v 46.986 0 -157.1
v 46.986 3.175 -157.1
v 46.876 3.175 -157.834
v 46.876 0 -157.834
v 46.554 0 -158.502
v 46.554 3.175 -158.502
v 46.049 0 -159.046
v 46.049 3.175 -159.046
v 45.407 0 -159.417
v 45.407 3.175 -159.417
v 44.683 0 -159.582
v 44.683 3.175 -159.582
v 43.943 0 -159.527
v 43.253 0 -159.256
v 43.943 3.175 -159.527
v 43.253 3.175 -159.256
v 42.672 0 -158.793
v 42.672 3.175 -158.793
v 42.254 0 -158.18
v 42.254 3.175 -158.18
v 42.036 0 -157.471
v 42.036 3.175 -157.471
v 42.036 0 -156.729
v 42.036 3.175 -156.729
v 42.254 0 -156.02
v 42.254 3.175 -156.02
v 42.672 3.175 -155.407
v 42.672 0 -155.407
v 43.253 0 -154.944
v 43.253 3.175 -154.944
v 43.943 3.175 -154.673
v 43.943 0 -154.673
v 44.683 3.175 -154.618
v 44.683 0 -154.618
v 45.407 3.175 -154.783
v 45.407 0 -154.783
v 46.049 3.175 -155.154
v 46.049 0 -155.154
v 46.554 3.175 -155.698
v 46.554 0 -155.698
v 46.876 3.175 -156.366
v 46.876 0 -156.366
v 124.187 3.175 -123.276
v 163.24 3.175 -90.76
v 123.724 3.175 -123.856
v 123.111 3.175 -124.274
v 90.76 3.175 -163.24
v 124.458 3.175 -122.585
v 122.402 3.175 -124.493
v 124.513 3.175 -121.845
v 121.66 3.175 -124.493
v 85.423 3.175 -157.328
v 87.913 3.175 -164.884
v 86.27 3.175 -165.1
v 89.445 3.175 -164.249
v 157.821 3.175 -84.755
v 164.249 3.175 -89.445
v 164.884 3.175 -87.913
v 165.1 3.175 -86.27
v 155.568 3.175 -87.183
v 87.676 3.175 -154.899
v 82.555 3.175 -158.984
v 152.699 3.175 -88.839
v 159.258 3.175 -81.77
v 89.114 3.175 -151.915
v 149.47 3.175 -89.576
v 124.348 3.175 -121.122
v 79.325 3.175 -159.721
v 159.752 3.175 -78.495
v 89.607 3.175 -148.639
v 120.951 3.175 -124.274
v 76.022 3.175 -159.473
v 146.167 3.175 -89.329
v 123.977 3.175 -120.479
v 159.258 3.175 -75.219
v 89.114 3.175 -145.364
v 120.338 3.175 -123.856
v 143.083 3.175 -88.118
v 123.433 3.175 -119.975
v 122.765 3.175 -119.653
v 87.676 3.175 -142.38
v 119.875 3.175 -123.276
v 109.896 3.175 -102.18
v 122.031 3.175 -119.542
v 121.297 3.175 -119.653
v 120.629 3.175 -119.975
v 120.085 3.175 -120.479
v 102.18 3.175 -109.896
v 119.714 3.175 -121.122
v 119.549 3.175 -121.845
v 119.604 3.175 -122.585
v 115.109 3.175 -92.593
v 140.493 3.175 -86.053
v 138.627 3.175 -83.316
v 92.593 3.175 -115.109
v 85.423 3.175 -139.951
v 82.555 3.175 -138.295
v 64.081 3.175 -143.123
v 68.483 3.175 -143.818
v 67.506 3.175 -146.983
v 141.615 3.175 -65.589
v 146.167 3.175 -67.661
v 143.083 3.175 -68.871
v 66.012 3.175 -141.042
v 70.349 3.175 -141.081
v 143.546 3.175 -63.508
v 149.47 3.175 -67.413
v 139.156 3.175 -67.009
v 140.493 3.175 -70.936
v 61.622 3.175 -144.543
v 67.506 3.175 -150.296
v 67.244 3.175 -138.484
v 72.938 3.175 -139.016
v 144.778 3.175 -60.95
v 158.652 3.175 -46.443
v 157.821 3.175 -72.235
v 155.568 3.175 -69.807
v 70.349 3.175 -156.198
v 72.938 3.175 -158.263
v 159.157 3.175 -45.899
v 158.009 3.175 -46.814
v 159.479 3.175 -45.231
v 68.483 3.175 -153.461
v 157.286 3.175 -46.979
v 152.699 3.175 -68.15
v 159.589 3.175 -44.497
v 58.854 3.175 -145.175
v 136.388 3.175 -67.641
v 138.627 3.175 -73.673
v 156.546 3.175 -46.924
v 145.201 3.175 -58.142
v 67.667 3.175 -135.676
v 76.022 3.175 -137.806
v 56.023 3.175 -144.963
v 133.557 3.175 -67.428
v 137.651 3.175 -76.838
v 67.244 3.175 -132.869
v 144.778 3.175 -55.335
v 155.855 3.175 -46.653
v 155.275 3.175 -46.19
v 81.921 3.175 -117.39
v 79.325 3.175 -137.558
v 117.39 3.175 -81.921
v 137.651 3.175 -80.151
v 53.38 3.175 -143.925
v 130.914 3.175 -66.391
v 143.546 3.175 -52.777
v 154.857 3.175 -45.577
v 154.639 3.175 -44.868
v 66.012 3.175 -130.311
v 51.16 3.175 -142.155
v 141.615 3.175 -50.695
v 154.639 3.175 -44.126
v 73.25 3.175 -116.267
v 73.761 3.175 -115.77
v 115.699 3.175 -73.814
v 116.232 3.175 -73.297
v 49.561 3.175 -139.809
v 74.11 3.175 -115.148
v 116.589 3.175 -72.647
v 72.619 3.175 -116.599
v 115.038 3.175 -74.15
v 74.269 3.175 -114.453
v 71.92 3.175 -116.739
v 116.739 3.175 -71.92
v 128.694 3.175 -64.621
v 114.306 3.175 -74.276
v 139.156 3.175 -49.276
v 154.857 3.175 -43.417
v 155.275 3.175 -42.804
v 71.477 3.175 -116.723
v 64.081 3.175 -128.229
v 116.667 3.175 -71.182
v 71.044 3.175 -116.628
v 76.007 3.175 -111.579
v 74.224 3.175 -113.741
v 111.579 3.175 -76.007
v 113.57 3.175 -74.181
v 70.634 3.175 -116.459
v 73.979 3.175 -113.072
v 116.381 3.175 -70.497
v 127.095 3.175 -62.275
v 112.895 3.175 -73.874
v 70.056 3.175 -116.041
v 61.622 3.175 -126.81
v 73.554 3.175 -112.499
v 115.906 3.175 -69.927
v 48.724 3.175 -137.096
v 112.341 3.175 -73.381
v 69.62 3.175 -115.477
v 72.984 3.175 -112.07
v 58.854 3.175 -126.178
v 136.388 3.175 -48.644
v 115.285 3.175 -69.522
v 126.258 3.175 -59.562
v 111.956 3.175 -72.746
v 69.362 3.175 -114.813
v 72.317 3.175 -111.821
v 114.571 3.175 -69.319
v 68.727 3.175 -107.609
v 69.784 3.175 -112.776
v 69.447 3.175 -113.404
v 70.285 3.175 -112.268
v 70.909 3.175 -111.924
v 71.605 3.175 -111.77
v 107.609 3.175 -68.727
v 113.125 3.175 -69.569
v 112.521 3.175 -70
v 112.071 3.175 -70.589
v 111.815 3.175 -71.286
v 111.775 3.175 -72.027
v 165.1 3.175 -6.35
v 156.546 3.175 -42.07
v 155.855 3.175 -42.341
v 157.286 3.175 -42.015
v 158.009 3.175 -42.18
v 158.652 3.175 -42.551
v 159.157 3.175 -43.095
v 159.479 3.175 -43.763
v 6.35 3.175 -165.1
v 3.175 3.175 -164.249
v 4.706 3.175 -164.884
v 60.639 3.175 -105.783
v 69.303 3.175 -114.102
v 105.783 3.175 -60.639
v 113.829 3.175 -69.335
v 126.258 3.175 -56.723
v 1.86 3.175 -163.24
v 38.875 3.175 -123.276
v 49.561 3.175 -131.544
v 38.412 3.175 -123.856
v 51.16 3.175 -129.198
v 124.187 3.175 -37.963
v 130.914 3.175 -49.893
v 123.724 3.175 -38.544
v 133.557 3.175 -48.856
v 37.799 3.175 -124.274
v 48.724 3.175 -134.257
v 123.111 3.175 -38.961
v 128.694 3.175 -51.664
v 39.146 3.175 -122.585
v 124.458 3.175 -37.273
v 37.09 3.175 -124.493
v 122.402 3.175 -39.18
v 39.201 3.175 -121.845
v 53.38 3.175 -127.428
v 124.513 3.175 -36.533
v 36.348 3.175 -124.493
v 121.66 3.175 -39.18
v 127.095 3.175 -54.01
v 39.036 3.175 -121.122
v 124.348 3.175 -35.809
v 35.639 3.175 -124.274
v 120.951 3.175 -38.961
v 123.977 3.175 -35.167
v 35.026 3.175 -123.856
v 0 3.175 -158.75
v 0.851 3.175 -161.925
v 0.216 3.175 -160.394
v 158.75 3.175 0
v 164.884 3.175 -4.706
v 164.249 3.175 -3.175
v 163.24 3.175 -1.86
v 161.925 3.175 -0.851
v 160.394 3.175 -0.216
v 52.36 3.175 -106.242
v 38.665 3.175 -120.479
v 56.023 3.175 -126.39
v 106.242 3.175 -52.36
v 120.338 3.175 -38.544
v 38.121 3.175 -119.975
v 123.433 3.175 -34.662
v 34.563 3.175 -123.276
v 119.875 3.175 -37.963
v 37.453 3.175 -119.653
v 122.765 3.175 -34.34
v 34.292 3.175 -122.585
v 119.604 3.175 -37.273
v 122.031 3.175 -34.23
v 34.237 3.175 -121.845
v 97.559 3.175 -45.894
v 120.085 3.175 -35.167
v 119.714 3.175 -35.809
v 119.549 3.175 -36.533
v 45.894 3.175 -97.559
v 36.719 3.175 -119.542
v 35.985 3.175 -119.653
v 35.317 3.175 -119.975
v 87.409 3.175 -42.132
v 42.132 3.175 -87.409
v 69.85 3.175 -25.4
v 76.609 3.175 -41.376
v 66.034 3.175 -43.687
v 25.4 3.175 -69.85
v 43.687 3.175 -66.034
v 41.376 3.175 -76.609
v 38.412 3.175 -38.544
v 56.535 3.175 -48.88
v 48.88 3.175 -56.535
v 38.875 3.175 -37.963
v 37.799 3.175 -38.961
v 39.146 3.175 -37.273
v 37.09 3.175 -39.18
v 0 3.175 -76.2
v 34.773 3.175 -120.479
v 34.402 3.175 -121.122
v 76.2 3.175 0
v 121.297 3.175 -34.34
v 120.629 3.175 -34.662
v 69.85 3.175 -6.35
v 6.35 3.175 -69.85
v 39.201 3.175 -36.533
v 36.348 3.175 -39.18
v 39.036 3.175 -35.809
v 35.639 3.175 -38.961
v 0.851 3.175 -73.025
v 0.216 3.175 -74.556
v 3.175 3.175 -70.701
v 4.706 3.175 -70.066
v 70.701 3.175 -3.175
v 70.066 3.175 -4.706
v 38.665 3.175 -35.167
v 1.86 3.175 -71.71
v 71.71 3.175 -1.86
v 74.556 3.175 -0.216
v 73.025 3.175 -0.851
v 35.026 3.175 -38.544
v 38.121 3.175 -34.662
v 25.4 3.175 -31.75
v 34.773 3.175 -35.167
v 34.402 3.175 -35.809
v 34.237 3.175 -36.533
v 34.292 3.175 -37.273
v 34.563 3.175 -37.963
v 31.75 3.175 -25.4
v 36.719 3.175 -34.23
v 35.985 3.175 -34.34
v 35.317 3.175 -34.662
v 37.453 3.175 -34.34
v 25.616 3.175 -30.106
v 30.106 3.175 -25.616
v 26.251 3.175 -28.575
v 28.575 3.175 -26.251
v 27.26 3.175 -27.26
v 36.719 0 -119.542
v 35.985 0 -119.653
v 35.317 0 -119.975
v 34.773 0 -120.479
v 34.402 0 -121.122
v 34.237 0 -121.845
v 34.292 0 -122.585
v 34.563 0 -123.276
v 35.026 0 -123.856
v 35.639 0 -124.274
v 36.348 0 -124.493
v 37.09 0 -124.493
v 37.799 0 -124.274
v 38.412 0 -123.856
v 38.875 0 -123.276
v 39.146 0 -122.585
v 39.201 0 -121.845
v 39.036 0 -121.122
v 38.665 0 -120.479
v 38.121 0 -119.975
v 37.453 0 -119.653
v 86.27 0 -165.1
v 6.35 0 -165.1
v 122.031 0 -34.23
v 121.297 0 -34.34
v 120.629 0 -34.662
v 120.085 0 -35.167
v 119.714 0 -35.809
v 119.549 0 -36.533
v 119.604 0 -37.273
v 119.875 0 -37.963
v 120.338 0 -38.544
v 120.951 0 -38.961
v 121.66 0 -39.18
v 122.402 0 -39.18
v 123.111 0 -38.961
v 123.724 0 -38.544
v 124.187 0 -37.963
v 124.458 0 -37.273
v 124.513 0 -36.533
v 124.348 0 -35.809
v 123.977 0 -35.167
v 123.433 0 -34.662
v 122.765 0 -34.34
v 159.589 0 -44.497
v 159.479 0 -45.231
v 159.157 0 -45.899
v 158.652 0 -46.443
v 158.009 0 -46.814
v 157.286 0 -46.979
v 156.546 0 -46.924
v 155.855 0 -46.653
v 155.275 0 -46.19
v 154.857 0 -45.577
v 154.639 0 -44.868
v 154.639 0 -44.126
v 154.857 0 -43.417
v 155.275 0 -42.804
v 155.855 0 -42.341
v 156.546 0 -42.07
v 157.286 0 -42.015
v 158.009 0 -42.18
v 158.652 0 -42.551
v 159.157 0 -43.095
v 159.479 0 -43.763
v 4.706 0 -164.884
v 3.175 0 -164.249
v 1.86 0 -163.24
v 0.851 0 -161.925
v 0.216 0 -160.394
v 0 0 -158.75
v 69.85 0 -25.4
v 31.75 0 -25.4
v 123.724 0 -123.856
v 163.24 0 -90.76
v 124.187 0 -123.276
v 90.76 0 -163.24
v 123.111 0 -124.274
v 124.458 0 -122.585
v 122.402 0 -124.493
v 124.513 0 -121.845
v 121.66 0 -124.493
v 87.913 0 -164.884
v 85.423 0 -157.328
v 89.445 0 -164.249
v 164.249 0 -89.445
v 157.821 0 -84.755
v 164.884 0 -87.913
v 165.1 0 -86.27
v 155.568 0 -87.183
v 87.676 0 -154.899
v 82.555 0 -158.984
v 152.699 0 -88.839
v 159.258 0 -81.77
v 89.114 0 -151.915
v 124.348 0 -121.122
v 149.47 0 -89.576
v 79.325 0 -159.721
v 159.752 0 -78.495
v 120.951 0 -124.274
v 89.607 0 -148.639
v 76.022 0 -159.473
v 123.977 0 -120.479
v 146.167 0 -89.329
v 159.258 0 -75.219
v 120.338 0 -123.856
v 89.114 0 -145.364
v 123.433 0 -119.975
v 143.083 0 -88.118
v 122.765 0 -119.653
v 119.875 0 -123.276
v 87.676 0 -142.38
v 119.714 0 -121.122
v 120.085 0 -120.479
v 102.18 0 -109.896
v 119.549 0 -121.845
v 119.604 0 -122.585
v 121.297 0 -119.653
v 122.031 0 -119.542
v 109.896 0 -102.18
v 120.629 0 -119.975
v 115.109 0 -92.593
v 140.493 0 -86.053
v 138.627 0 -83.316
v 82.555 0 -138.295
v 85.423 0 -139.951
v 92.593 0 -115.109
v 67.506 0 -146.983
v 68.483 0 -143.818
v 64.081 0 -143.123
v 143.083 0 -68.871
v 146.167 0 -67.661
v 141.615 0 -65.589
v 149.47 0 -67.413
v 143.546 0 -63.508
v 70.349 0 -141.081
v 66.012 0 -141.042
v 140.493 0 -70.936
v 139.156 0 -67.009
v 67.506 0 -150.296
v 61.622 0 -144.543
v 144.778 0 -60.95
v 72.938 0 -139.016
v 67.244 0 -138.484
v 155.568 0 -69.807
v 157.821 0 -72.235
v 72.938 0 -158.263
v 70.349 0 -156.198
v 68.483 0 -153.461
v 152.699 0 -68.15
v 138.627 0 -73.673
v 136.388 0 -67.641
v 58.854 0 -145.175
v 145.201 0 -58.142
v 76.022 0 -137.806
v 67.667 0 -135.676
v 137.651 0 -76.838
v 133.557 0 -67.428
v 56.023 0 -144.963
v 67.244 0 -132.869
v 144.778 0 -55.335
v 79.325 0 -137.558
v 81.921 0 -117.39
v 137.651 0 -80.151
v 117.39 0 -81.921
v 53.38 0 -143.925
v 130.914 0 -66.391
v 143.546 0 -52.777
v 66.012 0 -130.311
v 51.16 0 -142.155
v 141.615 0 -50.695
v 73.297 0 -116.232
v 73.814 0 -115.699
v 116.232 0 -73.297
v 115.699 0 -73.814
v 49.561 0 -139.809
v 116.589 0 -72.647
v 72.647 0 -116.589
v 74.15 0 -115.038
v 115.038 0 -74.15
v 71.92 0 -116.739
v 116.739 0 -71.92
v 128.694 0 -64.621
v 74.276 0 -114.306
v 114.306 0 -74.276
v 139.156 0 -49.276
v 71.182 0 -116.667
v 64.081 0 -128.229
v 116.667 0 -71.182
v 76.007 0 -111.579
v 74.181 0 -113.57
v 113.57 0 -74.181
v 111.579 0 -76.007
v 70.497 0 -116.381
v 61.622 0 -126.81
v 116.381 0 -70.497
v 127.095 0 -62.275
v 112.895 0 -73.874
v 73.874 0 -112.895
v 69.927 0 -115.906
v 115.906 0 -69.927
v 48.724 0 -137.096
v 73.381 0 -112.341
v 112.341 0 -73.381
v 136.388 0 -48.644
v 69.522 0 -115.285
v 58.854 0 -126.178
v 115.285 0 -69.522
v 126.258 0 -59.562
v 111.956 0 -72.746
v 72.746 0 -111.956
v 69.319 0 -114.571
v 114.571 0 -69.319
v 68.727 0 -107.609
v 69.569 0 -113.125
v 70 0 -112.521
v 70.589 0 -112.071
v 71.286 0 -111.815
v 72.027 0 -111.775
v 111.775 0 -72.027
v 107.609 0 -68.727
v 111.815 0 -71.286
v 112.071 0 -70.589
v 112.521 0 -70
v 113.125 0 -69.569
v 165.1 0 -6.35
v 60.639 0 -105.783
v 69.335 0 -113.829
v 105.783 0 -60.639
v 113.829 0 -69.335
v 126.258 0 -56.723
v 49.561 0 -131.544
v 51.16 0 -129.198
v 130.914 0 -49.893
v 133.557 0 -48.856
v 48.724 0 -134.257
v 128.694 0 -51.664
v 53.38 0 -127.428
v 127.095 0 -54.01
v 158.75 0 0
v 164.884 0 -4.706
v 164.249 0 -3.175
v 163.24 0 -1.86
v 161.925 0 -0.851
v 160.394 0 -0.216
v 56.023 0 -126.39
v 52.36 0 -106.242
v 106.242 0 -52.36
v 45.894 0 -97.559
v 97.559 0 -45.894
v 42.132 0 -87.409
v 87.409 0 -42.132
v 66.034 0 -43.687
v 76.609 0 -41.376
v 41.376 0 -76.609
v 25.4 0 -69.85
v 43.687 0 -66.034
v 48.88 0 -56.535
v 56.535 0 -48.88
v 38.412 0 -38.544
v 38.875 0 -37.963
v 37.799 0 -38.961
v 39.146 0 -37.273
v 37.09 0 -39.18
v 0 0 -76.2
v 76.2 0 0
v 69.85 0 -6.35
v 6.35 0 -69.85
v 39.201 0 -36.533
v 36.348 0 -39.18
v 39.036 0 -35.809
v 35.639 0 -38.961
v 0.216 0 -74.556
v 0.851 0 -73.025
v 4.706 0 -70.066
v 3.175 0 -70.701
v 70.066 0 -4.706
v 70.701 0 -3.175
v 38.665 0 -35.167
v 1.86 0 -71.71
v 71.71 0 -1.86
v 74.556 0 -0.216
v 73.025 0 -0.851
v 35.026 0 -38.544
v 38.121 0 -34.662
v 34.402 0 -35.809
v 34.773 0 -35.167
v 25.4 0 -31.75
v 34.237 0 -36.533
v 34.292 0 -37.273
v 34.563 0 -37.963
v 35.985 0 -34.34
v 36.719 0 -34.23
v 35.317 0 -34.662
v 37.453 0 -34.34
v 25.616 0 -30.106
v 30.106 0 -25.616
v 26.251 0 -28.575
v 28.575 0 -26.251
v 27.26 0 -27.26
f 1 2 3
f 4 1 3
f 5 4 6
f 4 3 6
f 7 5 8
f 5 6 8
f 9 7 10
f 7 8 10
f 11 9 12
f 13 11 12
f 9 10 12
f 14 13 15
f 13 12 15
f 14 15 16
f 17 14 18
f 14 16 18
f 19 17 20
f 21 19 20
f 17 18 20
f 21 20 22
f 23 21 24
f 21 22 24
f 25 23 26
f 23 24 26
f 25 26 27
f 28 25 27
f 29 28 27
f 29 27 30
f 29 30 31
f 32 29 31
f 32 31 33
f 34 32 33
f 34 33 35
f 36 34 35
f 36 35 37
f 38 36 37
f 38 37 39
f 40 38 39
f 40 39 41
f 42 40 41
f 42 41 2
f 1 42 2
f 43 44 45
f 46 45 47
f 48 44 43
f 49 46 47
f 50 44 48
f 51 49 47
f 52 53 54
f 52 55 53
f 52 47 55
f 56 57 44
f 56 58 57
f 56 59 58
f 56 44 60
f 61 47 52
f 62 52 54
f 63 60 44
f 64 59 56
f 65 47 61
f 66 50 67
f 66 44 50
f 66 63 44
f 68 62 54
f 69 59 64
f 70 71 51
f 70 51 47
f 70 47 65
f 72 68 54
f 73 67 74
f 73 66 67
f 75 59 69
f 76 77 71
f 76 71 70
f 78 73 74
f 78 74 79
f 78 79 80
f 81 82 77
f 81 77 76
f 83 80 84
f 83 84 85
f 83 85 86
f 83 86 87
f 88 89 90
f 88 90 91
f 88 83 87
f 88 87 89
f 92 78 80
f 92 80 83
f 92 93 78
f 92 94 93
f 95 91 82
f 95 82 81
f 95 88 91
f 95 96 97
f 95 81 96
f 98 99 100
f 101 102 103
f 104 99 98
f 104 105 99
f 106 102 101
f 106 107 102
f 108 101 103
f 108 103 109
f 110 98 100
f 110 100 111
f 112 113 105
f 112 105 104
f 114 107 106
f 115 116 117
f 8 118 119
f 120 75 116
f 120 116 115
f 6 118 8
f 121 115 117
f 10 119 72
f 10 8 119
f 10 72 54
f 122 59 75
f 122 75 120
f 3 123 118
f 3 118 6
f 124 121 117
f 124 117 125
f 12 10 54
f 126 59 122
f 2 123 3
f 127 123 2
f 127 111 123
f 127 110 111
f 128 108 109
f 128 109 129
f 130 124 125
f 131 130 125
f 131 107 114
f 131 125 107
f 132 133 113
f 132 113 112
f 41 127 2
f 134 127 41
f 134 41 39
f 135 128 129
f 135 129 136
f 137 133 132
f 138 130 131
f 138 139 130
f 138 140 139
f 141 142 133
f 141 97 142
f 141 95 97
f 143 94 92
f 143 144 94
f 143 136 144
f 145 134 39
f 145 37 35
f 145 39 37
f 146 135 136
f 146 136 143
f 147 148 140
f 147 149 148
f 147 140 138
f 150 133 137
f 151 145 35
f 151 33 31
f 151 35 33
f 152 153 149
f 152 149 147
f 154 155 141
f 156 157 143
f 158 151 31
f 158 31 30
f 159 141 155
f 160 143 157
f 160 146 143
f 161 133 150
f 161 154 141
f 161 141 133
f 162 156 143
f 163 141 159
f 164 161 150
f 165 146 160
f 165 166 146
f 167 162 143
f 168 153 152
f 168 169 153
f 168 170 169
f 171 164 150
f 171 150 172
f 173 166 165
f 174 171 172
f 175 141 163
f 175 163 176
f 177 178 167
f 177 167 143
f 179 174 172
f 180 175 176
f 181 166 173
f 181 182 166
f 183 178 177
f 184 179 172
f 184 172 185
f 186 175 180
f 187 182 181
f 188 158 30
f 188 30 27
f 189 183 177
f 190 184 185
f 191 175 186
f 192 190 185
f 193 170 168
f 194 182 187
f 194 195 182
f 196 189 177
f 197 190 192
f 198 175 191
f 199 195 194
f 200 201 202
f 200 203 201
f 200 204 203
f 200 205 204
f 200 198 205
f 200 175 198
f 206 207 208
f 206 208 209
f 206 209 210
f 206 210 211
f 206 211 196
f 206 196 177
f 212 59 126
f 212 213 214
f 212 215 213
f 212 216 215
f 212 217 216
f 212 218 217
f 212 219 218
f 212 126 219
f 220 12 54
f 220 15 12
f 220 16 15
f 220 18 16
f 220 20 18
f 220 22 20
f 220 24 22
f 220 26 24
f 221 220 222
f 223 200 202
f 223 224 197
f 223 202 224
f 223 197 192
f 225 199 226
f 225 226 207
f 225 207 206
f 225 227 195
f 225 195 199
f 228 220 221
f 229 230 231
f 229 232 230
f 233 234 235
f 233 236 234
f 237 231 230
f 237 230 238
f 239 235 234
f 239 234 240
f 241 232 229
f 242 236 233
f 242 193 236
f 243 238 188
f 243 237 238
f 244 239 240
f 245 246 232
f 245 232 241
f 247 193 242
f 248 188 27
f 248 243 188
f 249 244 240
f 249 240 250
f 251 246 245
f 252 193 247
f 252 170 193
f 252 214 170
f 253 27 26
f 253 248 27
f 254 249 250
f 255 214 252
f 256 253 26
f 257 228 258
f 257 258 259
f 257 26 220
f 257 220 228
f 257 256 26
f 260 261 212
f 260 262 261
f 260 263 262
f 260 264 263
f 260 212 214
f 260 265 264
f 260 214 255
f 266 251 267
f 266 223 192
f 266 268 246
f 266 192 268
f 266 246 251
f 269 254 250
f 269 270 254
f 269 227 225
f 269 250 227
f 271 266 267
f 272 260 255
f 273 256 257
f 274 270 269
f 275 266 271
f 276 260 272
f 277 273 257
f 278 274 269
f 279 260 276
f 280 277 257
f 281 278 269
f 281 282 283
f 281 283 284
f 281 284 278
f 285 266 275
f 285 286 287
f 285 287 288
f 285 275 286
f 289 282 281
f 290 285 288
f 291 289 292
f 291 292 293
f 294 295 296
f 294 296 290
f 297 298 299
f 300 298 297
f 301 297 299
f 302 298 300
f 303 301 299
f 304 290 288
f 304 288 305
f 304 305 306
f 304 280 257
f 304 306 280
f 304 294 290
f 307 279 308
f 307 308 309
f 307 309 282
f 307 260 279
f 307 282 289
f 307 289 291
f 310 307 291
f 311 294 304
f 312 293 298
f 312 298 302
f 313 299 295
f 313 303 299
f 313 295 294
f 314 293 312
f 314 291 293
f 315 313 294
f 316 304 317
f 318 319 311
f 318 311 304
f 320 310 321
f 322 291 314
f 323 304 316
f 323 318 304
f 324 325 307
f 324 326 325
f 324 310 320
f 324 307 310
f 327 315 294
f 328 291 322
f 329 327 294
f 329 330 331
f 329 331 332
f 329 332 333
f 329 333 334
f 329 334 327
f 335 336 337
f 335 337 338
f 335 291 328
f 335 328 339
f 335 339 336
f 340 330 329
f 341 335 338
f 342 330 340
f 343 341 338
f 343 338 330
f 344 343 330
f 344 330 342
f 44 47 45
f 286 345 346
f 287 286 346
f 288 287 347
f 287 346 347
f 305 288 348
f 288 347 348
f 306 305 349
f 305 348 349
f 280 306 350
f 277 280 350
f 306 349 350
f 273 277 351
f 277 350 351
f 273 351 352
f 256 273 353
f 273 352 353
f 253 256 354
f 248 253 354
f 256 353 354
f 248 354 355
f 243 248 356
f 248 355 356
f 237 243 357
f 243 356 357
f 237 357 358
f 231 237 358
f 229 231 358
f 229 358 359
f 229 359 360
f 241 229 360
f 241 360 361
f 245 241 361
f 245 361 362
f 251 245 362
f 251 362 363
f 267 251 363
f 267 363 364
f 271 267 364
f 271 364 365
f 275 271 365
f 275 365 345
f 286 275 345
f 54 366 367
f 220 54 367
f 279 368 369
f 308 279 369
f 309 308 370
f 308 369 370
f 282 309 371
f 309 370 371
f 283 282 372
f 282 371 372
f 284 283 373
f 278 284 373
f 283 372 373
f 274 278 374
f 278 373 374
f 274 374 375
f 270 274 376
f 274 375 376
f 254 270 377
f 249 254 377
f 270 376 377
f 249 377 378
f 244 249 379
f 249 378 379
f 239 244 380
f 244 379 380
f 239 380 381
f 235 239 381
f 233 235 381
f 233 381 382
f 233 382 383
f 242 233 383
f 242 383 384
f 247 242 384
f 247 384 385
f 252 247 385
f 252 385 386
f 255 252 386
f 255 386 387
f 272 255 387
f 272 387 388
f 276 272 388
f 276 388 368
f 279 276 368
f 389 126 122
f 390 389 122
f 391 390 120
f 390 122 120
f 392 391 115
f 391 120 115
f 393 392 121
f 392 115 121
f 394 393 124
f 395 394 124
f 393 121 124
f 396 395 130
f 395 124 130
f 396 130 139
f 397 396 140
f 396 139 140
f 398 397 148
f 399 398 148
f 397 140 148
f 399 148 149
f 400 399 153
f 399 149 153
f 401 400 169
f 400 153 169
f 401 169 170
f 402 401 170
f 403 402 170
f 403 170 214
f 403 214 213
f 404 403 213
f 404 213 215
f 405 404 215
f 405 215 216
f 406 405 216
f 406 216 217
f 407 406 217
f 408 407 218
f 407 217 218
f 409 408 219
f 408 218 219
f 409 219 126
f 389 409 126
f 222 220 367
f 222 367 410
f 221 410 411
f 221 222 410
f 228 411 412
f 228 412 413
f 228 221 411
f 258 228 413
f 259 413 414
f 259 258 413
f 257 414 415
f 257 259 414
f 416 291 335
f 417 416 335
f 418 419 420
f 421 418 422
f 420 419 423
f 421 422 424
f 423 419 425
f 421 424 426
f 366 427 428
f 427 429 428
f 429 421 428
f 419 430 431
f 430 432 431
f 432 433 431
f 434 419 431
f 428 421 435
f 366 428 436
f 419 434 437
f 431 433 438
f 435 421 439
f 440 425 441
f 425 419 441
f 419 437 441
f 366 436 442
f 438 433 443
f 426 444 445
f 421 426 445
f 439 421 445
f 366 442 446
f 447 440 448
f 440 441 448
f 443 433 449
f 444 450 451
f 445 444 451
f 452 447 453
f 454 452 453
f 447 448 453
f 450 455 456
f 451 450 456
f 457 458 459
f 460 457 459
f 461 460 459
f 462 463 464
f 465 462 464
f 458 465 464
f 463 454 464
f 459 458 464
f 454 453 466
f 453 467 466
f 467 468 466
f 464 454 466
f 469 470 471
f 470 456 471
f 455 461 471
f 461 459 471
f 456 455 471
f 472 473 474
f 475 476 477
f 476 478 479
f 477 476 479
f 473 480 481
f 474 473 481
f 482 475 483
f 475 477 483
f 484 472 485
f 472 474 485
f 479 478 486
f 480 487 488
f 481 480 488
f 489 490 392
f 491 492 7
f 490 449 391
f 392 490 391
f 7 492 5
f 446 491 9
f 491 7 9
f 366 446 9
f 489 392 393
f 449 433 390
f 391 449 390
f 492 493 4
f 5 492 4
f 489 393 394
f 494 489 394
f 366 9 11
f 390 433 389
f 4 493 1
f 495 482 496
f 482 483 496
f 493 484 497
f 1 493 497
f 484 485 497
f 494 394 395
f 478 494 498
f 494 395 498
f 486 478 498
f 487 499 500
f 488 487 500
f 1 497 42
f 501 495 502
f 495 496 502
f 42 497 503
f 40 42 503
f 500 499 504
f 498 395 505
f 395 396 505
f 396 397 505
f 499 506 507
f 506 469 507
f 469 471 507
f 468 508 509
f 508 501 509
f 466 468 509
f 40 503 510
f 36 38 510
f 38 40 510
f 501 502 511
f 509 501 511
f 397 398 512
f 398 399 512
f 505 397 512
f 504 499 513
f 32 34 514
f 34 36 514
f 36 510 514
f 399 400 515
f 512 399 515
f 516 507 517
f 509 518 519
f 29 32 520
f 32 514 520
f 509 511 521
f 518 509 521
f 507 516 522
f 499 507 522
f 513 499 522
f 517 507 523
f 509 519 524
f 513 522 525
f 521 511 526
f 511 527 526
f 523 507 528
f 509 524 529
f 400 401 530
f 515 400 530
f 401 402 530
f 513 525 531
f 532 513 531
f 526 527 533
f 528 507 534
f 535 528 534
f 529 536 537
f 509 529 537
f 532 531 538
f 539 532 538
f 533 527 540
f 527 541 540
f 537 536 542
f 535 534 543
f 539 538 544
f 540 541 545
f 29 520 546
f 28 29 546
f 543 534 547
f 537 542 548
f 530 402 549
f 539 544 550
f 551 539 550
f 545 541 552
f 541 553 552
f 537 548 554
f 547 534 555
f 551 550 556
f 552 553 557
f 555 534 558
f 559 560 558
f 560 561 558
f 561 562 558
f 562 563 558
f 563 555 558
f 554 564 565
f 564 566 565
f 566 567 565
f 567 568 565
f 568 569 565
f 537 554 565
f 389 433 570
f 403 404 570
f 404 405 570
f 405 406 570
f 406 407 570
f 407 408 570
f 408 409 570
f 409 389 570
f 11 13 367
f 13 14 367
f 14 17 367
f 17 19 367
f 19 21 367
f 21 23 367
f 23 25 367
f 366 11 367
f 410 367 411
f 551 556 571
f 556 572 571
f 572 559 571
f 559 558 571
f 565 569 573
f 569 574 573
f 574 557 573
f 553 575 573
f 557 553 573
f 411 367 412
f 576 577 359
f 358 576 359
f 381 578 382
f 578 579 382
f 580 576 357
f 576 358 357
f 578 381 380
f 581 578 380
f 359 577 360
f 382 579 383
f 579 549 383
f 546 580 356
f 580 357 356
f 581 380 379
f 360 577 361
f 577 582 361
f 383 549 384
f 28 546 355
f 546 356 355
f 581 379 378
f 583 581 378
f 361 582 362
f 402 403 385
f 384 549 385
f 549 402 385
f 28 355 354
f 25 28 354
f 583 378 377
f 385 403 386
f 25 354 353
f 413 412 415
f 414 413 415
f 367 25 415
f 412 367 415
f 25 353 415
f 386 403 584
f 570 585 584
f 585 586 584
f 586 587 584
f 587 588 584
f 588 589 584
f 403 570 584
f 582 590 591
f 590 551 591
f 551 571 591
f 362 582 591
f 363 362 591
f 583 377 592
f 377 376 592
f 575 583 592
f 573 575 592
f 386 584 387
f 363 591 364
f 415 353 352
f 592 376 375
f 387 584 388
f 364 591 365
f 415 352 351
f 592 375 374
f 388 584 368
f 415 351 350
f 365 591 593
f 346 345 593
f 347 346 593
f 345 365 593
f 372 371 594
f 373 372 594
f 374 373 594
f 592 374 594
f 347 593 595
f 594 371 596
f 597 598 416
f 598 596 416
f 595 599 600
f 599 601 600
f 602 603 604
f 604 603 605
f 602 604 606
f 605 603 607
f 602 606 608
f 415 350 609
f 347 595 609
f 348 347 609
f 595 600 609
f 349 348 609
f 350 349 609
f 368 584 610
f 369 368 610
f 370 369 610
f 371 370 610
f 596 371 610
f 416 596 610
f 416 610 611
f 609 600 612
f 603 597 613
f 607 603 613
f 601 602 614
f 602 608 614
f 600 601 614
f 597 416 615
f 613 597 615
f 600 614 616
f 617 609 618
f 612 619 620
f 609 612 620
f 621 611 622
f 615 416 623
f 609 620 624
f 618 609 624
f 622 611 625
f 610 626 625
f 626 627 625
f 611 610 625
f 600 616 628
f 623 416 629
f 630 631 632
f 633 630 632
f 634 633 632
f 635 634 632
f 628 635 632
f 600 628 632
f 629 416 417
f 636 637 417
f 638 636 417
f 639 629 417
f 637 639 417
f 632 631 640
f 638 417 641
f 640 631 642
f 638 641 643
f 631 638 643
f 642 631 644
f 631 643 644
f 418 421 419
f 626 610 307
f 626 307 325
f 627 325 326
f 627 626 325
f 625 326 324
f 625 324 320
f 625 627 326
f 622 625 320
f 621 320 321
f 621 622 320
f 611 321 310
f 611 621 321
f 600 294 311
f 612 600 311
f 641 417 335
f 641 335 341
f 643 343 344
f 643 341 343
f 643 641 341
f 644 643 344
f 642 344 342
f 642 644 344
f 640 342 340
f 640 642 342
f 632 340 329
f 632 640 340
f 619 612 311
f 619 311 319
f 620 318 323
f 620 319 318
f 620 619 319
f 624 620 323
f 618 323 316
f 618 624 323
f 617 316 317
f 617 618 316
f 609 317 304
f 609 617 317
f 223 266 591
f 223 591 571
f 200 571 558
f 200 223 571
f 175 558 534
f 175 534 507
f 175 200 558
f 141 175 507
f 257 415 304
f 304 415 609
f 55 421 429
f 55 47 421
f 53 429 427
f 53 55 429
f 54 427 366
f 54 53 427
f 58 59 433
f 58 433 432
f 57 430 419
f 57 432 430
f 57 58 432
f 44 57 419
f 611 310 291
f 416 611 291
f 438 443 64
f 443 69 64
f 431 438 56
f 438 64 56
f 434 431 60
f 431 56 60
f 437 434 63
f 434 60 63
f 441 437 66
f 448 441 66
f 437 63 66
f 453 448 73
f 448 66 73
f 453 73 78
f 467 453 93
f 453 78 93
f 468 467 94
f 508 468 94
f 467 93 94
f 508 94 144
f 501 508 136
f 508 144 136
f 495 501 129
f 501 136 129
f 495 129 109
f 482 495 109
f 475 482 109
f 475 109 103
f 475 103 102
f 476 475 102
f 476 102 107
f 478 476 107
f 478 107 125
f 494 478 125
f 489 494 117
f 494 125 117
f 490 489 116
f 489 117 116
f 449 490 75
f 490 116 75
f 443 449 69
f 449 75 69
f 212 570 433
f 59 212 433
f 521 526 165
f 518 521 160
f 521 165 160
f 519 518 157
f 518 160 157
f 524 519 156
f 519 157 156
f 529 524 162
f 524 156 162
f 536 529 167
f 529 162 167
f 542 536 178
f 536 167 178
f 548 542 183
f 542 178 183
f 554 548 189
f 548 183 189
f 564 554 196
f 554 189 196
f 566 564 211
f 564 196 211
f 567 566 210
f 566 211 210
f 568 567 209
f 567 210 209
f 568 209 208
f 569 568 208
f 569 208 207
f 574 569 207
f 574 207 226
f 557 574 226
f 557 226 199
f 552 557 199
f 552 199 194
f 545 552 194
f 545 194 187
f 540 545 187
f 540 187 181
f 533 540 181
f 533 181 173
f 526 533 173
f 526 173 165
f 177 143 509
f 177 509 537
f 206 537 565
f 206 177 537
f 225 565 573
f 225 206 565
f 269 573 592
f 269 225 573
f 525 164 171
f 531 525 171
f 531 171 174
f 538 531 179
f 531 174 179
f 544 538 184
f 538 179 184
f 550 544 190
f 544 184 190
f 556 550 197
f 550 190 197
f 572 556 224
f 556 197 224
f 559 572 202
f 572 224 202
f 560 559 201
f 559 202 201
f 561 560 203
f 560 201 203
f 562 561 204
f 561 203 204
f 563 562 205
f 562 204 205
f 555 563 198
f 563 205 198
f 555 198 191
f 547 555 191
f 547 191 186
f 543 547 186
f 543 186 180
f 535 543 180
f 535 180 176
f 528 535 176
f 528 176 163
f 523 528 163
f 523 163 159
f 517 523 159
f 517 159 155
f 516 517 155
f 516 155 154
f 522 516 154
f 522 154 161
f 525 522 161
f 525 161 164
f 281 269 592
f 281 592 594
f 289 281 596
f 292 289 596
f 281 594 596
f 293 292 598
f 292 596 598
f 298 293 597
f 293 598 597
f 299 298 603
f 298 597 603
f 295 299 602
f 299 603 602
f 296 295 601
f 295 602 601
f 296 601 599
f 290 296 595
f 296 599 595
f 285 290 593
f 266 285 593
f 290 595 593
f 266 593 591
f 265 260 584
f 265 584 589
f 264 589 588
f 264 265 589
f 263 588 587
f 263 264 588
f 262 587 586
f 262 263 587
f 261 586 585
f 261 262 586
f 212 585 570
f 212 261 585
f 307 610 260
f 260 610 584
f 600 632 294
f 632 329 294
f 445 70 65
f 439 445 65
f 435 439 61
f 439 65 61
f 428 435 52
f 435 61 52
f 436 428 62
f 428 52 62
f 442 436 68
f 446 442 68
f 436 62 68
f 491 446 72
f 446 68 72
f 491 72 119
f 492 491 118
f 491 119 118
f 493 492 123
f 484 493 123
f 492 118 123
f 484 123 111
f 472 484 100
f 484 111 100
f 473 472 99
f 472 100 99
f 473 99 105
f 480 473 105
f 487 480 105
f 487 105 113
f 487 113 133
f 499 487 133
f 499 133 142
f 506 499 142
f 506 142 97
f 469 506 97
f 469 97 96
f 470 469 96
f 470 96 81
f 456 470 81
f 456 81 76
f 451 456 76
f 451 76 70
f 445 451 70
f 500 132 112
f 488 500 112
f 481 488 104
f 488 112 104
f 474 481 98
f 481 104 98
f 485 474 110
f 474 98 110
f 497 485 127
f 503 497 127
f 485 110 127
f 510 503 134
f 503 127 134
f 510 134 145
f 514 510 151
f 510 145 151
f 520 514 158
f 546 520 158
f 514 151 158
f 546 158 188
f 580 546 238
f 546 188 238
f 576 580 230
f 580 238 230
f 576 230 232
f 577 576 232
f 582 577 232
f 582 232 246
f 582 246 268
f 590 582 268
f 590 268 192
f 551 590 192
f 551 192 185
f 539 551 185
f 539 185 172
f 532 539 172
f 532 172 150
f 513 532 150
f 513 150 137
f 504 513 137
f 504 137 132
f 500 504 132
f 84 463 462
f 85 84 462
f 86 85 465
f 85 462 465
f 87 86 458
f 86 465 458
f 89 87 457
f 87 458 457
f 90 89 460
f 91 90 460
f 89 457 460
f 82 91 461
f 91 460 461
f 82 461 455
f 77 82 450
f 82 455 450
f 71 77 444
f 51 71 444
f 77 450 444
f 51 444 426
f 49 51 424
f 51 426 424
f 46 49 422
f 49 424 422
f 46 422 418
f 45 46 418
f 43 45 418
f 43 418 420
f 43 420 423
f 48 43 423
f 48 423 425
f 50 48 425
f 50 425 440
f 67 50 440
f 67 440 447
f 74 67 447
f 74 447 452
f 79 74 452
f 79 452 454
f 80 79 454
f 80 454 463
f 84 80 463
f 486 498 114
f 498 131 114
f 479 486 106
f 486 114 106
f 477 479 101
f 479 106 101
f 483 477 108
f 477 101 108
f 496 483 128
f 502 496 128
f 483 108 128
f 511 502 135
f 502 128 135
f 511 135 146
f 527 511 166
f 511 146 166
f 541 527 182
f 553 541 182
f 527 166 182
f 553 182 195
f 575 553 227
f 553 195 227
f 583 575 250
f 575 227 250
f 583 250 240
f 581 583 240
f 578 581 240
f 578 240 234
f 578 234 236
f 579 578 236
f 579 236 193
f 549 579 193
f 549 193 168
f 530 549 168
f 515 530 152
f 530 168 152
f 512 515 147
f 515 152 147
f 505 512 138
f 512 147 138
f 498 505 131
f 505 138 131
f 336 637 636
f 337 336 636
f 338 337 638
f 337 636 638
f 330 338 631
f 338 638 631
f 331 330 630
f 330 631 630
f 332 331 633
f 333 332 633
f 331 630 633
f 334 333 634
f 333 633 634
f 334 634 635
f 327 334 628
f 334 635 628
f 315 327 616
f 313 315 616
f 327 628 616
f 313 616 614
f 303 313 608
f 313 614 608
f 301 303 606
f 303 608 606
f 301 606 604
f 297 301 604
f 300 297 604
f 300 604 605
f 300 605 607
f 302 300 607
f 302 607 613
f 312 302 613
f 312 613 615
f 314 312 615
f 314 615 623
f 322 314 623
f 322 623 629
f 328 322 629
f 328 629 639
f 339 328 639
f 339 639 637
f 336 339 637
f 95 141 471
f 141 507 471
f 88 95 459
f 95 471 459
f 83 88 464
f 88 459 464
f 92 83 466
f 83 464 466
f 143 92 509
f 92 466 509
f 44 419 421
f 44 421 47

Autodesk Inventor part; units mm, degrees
ref_plane "YZ Plane" through (0, 0, 0) normal (1, 0, 0) x (0, 1, 0)
ref_plane "XZ Plane" through (0, 0, 0) normal (0, 1, 0) x (-1, 0, 0)
ref_plane "XY Plane" through (0, 0, 0) normal (0, 0, 1) x (1, 0, 0)
sketch "Sketch1" plane through (0, 0, 0) normal (0, 1, 0) x (-1, 0, 0)
  line L0 (0, 0) -> (-165.1, 0)
  line L1 (-165.1, 0) -> (-165.1, -165.1)
  line L2 (-165.1, -165.1) -> (0, -165.1)
  line L3 (0, -165.1) -> (0, 0)
  circle A0 centre (-79.375, -79.375) radius 38.1
  line L4 (-25.4, -165.1) -> (-25.4, 0) construction
  line L5 (0, -25.4) -> (-165.1, -25.4) construction
  line L6 (0, 0) -> (-165.1, -165.1) construction
  circle A1 centre (-79.375, -79.375) radius 53.975 construction
  dimension "d0" = 76.2
  dimension "d3" = 25.4
  dimension "d4" = 25.4
  dimension "d5" = 107.95
  dimension "d25" = 165.1
extrude "Extrusion1" add sketch "Sketch1" along normal blind 3.175
sketch "Sketch2" plane through (0, 3.175, 0) normal (0, 1, 0) x (1, 0, 0)
  circle A0 centre (79.375, 79.375) radius 38.1 construction
  circle A1 centre (79.375, 79.375) radius 60.325 construction
  line L0 (0, 165.1) -> (0, 0) construction
  arc A2 (184.15, 82.55) -> (82.55, 184.15) centre (82.55, 82.55) ccw construction
  line L1 (36.7188, 36.7188) -> (122.0312, 36.7188) construction
  line L2 (122.0312, 36.7188) -> (122.0312, 122.0312) construction
  line L3 (122.0312, 122.0312) -> (36.7188, 122.0312) construction
  line L4 (36.7188, 122.0312) -> (36.7188, 36.7188) construction
  dimension "d9" = 120.65
hole "Hole1" at (36.7188, 3.175, -36.7188) at (122.0312, 3.175, -122.0312) at (122.0312, 3.175, -36.7188) at (36.7188, 3.175, -122.0312) direction (0, -1, 0) diameter 4.9784 end through all
sketch "Sketch3" plane through (0, 3.175, 0) normal (0, 1, 0) x (1, 0, 0)
  circle A0 centre (79.375, 79.375) radius 38.1 construction
  circle A1 centre (79.375, 79.375) radius 53.975 construction
  circle A2 centre (58.1423, 135.6764) radius 9.525
  line L0 (0, 0) -> (79.375, 79.375) construction
  circle A3 centre (135.6764, 58.1423) radius 9.525
  circle A4 centre (122.0312, 122.0312) radius 2.4892 construction
  circle A5 centre (58.1423, 135.6764) radius 24.13 construction
  line L1 (79.375, 79.375) -> (78.4947, 148.6394) construction
  circle A6 centre (78.4947, 148.6394) radius 11.1125
  circle A7 centre (148.6394, 78.4947) radius 11.1125
  circle A8 centre (58.1423, 135.6764) radius 25.4 construction
  circle A9 centre (122.0312, 122.0312) radius 4.7625 construction
  circle A10 centre (58.1423, 135.6764) radius 29.9974 construction
  circle A11 centre (36.7188, 122.0312) radius 2.4892 projected
  circle A12 centre (44.4971, 157.1) radius 2.4892
  circle A13 centre (122.0312, 36.7188) radius 2.4892
  circle A14 centre (157.1, 44.4971) radius 2.4892
  circle A15 centre (71.7875, 114.2529) radius 2.4892
  circle A16 centre (114.2529, 71.7875) radius 2.4892
  circle A17 centre (79.375, 79.375) radius 38.1 projected
  arc A18 (52.3602, 106.2416) -> (81.9214, 117.3898) centre (58.1423, 135.6764) ccw
  arc A19 (117.3898, 81.9214) -> (106.2416, 52.3602) centre (135.6764, 58.1423) ccw
  circle A20 centre (36.7188, 122.0312) radius 2.4892 projected
  line L2 (36.7188, 122.0312) -> (78.4947, 148.6394) construction
  point P0 (117.3898, 81.9214)
  point P1 (106.2416, 52.3602)
  dimension "d33" = 48.26
  dimension "d17" = 107.95
  dimension "d19" = 19.05
  dimension "d34" = 69.27
  dimension "d35" = 22.225
  dimension "d37" = 50.8
  dimension "d38" = 59.9948
  dimension "d39" = 9.525
  dimension "d52" = 4.9784
  dimension "d53" = 90
  dimension "d56" = 90
extrude "Extrusion5" cut sketch "Sketch3" against normal through all contours A2 | A3 | A6 | A7 | A12 | A14 | A15 A17 | A17 A15 | A17 A16 | A16 A17
extrude "Extrusion6" add sketch "Sketch3" against normal up to surface (3.175 mm away) contours A15 A17 A18 | A17 A16 A19
sketch "Sketch5" plane through (0, 3.175, 0) normal (0, 1, 0) x (1, 0, 0)
  line L0 (0, 165.1) -> (0, 0) projected
  line L1 (0, 0) -> (25.4, 0)
  line L2 (25.4, 0) -> (25.4, 69.85)
  line L3 (25.4, 69.85) -> (0, 69.85)
  line L4 (0, 69.85) -> (0, 0)
  line L5 (25.4, 0) -> (69.85, 0)
  line L6 (69.85, 0) -> (69.85, 25.4)
  line L7 (69.85, 25.4) -> (25.4, 25.4)
  line L8 (25.4, 25.4) -> (25.4, 0)
  dimension "d63" = 25.4
  dimension "d64" = 69.85
  dimension "d65" = 44.45
  dimension "d66" = 25.4
extrude "Extrusion7" cut sketch "Sketch5" against normal up to surface (3.175 mm away)
chamfer "Chamfer3" distance 76.2 angle 45 1 edges at (165.1, 1.5875, -165.1)
fillet "Fillet6" radius 6.35 7 edges at (165.1, 1.5875, 0) (165.1, 1.5875, -88.9) (88.9, 1.5875, -165.1) (0, 1.5875, -165.1) (25.4, 1.5875, -25.4) (0, 1.5875, -69.85) (69.85, 1.5875, 0)
properties part number "TopPlate2"
